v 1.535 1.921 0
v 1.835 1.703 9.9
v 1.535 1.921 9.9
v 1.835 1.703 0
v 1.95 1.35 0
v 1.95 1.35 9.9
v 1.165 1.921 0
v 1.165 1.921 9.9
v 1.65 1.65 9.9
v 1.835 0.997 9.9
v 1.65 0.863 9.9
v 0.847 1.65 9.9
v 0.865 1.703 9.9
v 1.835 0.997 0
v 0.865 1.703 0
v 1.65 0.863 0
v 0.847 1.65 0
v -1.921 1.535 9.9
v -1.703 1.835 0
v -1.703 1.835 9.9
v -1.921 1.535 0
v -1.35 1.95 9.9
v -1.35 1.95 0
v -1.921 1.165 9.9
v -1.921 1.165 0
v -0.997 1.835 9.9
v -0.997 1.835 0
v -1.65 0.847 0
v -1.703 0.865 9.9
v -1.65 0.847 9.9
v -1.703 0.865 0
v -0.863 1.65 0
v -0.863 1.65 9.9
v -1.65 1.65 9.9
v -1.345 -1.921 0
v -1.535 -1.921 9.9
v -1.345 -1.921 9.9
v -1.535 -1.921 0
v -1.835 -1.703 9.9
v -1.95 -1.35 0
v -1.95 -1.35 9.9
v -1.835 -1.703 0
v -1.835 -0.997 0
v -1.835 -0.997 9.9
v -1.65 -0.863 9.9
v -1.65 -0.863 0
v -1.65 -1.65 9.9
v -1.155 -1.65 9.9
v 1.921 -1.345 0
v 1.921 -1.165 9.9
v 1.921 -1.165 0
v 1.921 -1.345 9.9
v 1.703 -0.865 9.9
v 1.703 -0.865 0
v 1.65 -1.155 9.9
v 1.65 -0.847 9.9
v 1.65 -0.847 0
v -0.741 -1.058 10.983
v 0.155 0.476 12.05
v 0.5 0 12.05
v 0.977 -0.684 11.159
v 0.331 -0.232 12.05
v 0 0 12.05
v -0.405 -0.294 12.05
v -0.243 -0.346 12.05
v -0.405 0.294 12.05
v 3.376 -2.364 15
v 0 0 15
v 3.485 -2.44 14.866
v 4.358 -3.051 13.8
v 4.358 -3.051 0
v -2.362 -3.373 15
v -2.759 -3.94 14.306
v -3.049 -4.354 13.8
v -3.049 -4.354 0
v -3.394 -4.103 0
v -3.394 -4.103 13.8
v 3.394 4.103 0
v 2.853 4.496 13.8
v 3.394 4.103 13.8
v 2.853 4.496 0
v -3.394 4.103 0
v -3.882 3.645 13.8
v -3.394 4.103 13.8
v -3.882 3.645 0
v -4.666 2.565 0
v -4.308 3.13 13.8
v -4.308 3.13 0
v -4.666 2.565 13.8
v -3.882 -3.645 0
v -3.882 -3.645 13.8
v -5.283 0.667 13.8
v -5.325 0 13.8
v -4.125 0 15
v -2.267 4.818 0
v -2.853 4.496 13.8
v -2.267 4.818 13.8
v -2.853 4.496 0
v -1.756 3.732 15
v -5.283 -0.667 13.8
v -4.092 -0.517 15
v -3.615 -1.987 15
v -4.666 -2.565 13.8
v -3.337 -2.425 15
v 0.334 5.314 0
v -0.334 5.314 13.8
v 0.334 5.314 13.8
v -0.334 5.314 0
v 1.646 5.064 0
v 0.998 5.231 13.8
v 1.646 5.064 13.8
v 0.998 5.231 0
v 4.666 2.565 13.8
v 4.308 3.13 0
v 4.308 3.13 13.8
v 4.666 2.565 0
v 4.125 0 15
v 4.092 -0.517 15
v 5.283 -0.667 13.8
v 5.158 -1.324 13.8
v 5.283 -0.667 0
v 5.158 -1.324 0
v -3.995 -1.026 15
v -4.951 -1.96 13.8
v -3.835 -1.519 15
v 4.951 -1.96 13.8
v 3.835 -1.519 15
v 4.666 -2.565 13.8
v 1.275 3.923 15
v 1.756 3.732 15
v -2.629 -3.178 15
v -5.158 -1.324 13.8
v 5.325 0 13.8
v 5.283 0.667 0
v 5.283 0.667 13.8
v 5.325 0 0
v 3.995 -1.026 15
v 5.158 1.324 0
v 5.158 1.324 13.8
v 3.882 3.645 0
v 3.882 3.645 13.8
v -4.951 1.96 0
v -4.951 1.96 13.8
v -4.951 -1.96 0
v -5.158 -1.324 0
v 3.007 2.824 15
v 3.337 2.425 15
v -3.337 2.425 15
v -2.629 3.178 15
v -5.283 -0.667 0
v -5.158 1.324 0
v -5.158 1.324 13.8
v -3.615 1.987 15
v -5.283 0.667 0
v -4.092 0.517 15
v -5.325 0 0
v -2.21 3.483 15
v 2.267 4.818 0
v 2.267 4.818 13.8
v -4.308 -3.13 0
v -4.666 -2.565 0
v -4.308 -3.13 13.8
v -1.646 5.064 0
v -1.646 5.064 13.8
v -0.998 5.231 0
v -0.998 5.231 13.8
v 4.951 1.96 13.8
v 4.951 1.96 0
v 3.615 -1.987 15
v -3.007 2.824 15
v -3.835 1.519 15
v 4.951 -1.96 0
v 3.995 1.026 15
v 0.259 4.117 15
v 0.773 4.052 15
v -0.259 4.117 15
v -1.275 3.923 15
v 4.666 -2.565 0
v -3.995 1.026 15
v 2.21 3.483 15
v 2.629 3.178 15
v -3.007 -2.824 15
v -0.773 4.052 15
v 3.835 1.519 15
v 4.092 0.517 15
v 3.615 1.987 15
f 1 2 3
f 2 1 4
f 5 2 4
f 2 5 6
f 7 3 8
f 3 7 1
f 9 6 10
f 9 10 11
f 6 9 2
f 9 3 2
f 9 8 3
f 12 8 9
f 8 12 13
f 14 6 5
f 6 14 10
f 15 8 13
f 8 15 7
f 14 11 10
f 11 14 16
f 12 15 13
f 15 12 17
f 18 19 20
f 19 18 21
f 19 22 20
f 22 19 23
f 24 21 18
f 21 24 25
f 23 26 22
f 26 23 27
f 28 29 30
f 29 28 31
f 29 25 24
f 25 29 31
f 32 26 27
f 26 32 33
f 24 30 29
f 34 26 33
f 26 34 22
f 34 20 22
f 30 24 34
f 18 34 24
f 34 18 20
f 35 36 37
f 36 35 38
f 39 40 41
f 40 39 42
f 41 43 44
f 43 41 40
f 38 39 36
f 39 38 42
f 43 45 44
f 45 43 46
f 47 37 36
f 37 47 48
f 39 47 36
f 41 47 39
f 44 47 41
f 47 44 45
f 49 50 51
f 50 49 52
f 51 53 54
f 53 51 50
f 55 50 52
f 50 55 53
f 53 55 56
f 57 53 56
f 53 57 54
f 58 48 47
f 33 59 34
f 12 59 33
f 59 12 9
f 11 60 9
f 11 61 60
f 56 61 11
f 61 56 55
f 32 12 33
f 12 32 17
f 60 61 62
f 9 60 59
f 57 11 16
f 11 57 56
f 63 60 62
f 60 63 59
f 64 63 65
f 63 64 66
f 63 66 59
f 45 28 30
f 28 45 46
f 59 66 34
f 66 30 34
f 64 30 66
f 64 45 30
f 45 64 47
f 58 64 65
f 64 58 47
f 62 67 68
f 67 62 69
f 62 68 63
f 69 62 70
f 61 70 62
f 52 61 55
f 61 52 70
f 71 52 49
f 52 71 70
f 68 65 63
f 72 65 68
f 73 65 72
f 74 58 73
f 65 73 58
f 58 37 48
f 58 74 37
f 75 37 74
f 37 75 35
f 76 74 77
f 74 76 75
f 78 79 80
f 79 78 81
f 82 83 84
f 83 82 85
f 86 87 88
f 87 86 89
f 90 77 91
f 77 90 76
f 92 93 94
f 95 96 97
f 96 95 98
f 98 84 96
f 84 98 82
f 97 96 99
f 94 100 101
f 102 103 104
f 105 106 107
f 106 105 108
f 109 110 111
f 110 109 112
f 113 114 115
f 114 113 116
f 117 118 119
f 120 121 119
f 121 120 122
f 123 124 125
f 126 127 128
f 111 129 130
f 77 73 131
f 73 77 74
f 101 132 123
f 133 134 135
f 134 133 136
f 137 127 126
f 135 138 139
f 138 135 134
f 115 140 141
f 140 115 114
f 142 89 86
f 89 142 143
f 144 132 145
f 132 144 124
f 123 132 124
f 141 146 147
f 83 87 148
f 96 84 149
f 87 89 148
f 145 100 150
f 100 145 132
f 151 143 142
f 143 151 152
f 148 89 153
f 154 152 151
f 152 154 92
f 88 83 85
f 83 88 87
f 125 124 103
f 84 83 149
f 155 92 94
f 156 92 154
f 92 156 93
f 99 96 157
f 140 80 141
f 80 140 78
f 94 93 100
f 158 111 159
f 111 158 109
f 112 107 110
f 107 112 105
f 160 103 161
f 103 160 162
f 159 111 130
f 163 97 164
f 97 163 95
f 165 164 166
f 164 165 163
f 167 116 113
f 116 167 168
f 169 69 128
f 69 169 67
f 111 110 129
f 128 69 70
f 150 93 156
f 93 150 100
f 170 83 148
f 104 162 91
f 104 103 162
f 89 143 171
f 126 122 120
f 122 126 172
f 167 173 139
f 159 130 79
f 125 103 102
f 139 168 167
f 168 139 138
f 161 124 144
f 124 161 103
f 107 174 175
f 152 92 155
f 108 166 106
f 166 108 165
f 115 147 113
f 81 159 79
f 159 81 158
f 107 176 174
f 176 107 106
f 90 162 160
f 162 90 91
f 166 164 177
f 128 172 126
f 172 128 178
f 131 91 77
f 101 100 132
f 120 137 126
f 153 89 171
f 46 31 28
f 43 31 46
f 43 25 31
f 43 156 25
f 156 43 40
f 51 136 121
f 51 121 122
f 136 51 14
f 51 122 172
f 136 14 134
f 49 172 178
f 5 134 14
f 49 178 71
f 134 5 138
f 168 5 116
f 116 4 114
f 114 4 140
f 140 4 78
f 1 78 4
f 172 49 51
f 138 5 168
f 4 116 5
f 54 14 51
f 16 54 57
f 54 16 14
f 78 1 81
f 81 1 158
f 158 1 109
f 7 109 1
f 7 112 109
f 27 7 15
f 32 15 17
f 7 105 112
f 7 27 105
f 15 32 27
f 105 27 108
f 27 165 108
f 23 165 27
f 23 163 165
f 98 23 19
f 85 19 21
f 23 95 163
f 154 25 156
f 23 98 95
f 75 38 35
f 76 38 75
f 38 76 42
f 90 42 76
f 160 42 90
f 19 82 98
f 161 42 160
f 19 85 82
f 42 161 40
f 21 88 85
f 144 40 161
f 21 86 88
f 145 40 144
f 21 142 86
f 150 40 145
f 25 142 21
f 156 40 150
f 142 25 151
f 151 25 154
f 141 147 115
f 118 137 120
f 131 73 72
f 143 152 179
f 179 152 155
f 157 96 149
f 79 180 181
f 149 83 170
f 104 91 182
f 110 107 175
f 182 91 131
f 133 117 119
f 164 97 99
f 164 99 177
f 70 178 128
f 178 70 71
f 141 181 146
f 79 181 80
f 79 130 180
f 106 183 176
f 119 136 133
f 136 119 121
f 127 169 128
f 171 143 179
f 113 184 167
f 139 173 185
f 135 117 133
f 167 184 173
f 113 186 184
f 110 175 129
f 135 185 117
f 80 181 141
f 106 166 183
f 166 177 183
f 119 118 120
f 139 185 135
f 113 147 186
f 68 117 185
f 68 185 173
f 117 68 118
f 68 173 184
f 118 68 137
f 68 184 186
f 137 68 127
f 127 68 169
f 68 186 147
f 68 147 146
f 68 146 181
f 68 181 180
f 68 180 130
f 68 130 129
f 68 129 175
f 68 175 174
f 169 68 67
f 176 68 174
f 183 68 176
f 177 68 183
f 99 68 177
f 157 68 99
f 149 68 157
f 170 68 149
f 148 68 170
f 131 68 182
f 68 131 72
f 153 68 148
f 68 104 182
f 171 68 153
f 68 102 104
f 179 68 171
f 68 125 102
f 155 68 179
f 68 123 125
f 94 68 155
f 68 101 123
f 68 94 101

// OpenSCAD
// Push button generator
// Makes round or square buttons with round or square shaft holes, and bevelled edges
// square holes are keyholed to prevent rounding of internal corners
// holes are vaulted so no support will be needed inside them
// customizer compatible
// @todo add optional flange at the base of the button

//defualt is to
// Make replacement buttons for Atlas stove
// button is a round button press fit onto a square 3.3mm shaft
// this is a standard size for "isostat" switches

/* [Global] */
//Visualising
Show="CrossSection"; //[Complete,CrossSection]
//Outside shape of button
ButtonShape="Round"; //[Round,Square,Oval]

/* [Button] */
//Length of Button
L=15;

//Outside Diameter of Round Button
ButtonOD=10.65;

//Rectangular or oval ButtonX
ButtonX=15;
//Rectangular or oval ButtonY
ButtonY=10;

//amount of bevel around top edge of button
TopBevel=1.2;
//Style of the button edge (for square buttons)
EdgeStyle="Round"; //[Radius,Bevel,Square]
//Bevel of bevelled edges. (This is X,Y distance, not the bevel face length)
EdgeBevel=1.2;
//Radius of rounded edges
EdgeR=1.2;
   
/* [Shaft Hole] */
ShaftShape="Square"; //[Square,Round]
//Length of shaft inside button. Crown of hole is vaulted for support free build
ShaftL=10;
//Side width of square shafts or diameter of round shafts
ShaftW=3.3;
//Oversize in mm for internal holes (diameter). UP printer makes internal holes small. Adjuest this for correct internal size
holeos=0;
//So that square shaft holes don't have rounded corners they must have a keyhole at the corner
ShaftKeyholeD=1.2;

KeyholeR=ShaftKeyholeD/2;

OR=ButtonOD/2;
ShaftI=ShaftW+holeos; //side length or IR
ShaftR=(ShaftW+holeos)/2; //for round shafts

//------


module SqShaft() {
    hull() { 
    translate([-ShaftI/2,-ShaftI/2,0]) 
        cube([ShaftI, ShaftI,ShaftL]);
     translate([0,0,ShaftL+ShaftI/2])
        cylinder(r=0.5,h=0.5);
    }//hull
    KHO=ShaftI/2-KeyholeR/2;
    for (A=[0:3]) {
        rotate([0,0,A*90])            
            translate([KHO,KHO,0]) 
                cylinder(r=KeyholeR, h=ShaftL,$fn=10);
    }//for

}//mod
module RoundShaft() {
    cylinder(r=ShaftR, h=ShaftL, $fn=20);
    translate([0,0,ShaftL])
        cylinder(r1=ShaftR,r2=0.1,h=ShaftR); //vault at top of hole
}//mod

module RoundButton() {
        H1=L-TopBevel;
        hull() {
            cylinder(r=OR, h=H1, $fn=50);
            translate([0,0,H1]) 
            cylinder(r=OR-TopBevel, h=TopBevel,$fn=50);  
        };//hull  
}//mod

module SquareButton() {
        H1=L-TopBevel;
        hull() {
            //translate([0,0,H1/2]) cube([ButtonX,ButtonY,H1], center=true);
            for (iX=[1,-1],iY=[1,-1]) {         
                    translate([(ButtonX/2-EdgeBevel)*iX,(ButtonY/2-EdgeBevel)*iY,H1/2]) 
                        if (EdgeStyle=="Bevel") {
                                rotate([0,0,45]) //bevels are made by using edge of these cubes at 45deg
                                    cube([EdgeBevel*sqrt(2),EdgeBevel*sqrt(2),H1],center=true);
                        } else {
                            if (EdgeStyle!="Square") {
                                cylinder(r=EdgeR, h=H1, center=true,$fn=20);
                            } else {
                                cylinder(r=0.1, h=H1, center=true,$fn=20);
                            }//if                                
                        }//if
                    }//for
            translate([0,0,H1+TopBevel/2]) 
                 cube([ButtonX-(2*TopBevel),ButtonY-(2*TopBevel),TopBevel], center=true); //bevelled top
        }//hull  
}//mod

difference() {
    if (ButtonShape=="Square") {
        SquareButton();
    } else { //round, oval
        RoundButton();
    };
    translate([0,0,-0.1])  {
        if (ShaftShape=="Round") {
            RoundShaft();
        }else{
            SqShaft();
        }//if
        if (Show=="CrossSection") {
            //MM=max(ButtonX,ButtonY);
            rotate([0,0,-125]) cube([100,100,L+1]);
    }//if
}//translate
}//difference
